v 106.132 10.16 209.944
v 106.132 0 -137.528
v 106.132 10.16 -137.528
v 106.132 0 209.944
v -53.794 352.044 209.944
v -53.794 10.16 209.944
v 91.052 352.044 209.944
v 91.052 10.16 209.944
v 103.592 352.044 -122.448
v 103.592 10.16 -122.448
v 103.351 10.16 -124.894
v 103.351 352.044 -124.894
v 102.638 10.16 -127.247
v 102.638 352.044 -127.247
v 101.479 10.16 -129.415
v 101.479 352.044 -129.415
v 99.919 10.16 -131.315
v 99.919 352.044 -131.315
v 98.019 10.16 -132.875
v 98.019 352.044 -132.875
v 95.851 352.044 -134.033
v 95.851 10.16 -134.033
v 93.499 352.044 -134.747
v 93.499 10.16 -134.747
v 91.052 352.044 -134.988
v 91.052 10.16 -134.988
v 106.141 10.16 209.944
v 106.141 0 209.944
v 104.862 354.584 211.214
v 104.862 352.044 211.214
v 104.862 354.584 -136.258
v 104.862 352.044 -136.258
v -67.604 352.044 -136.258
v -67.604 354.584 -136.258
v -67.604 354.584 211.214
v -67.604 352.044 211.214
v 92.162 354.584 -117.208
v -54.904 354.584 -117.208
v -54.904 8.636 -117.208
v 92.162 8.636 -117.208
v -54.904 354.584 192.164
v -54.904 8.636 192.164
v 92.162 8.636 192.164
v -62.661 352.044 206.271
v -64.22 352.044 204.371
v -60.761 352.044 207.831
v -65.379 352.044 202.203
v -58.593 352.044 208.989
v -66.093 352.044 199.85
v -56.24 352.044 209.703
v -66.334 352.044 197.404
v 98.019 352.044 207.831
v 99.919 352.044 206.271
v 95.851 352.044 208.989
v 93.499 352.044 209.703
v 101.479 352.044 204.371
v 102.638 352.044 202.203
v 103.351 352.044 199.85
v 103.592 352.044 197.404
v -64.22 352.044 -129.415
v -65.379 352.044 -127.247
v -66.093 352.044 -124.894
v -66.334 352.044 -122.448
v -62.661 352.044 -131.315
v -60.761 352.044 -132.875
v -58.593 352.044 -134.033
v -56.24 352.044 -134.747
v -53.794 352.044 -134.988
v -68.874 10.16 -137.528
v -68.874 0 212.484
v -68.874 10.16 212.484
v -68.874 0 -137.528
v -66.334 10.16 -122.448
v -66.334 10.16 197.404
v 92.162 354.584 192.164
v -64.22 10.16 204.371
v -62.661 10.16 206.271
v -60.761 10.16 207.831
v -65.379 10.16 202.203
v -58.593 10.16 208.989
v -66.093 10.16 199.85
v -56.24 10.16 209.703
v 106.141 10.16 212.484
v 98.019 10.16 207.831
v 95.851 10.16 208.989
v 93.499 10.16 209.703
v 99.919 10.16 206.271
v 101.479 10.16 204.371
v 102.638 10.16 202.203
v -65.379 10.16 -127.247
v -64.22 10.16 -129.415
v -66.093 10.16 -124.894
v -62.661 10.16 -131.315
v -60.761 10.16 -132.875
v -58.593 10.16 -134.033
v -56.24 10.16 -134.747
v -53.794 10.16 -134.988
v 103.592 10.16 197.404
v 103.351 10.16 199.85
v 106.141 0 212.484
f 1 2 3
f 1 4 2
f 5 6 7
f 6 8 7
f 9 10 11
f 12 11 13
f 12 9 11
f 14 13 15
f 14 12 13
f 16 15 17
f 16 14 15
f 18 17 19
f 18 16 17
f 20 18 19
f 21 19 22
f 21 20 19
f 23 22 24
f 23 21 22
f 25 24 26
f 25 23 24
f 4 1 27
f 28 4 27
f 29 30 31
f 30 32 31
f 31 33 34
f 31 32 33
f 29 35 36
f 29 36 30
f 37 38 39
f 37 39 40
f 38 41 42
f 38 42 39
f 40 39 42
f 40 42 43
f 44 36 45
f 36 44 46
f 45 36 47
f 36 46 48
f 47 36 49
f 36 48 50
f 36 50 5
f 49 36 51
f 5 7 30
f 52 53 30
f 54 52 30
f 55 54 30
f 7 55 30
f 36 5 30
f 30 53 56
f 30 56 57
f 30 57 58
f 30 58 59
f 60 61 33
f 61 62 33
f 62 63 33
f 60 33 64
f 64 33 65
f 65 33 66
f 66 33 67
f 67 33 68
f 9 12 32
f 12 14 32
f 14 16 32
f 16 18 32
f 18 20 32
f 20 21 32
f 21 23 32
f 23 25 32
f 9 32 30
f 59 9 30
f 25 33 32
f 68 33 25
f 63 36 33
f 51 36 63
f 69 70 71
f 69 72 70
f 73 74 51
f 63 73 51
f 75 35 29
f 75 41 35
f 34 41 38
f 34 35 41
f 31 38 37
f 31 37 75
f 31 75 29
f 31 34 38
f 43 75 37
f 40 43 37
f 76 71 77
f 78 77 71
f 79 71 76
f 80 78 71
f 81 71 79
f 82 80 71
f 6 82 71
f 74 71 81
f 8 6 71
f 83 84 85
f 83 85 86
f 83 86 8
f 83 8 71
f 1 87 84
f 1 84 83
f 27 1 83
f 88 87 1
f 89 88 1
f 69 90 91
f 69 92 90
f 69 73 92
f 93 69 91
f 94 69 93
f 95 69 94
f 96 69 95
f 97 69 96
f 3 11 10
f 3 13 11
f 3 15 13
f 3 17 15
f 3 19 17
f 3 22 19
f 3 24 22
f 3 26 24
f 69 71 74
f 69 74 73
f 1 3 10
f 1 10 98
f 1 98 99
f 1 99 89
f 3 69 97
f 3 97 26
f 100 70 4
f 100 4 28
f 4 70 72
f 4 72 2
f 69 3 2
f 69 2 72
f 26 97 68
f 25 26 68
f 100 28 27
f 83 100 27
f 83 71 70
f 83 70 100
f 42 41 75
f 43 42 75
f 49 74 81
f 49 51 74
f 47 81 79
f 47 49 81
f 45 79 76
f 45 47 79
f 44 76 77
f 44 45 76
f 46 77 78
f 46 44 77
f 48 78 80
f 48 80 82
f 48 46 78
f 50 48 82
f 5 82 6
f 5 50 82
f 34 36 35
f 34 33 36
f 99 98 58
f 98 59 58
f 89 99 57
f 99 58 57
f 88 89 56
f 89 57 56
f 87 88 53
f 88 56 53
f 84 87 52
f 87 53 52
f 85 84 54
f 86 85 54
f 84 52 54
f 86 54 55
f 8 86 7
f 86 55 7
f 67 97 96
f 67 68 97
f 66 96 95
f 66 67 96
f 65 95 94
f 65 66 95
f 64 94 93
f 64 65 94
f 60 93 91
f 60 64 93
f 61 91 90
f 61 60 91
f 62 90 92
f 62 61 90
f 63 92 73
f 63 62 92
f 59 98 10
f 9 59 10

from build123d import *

# Parameters (mm, degrees)
SKETCH1_W            = 169.926
SKETCH1_H            = 344.932
BOSS_EXTRUDE1_DEPTH  = 379.984
SKETCH7_W            = 344.932
SKETCH7_H            = 10.16
BOSS_EXTRUDE4_DEPTH  = 2.54
SKETCH8_W            = 344.932
SKETCH8_H            = 10.16
BOSS_EXTRUDE5_DEPTH  = 2.54
SKETCH9_W            = 175.006
SKETCH9_H            = 10.16
BOSS_EXTRUDE6_DEPTH  = 2.54
SKETCH13_W           = 344.932
SKETCH13_H           = 2.54
BOSS_EXTRUDE9_DEPTH  = 1.27
SKETCH14_W           = 171.196
SKETCH14_H           = 2.54
BOSS_EXTRUDE10_DEPTH = 1.27
SKETCH15_W           = 346.202
SKETCH15_H           = 2.54
BOSS_EXTRUDE11_DEPTH = 1.27
SKETCH16_W           = 172.466
SKETCH16_H           = 2.54
BOSS_EXTRUDE12_DEPTH = 1.27
FILLET1_R            = 12.54
SKETCH23_W           = 175.014872456
SKETCH23_H           = 10.16
BOSS_EXTRUDE15_DEPTH = 2.54
SKETCH25_W           = 180.28813578
SKETCH25_H           = 28.656047844
CUT_EXTRUDE1_DEPTH   = 474.472
SKETCH26_W           = 147.066
SKETCH26_H           = 309.372
CUT_EXTRUDE2_DEPTH   = 345.948


with BuildPart() as part:
    # Sketch1 → Boss-Extrude1 (new body)
    with BuildSketch(Plane(origin=(0, 0, 0), x_dir=(1, 0, 0), z_dir=(0, 1, 0))):
        with Locations((18.629158276, -37.477981942)):
            Rectangle(SKETCH1_W, SKETCH1_H)
    extrude(amount=BOSS_EXTRUDE1_DEPTH)

    # Sketch7 → Boss-Extrude4 (add)
    with BuildSketch(Plane.ZY.offset(66.333841724)):
        with Locations((37.477981942, 5.08)):
            Rectangle(SKETCH7_W, SKETCH7_H)
    extrude(amount=BOSS_EXTRUDE4_DEPTH)

    # Sketch8 → Boss-Extrude5 (add)
    with BuildSketch(Plane(origin=(103.592158276, 0, 0), x_dir=(0, 0, -1), z_dir=(1, 0, 0))):
        with Locations((-37.477981942, 5.08)):
            Rectangle(SKETCH8_W, SKETCH8_H)
    extrude(amount=BOSS_EXTRUDE5_DEPTH)

    # Sketch9 → Boss-Extrude6 (add)
    with BuildSketch(Plane(origin=(0, 0, -134.988018058), x_dir=(-1, 0, 0), z_dir=(0, 0, -1))):
        with Locations((-18.629158276, 5.08)):
            Rectangle(SKETCH9_W, SKETCH9_H)
    extrude(amount=BOSS_EXTRUDE6_DEPTH)

    # Sketch13 → Boss-Extrude9 (add)
    with BuildSketch(Plane(origin=(103.592158276, 0, 0), x_dir=(0, 0, -1), z_dir=(1, 0, 0))):
        with Locations((-37.477981942, 353.314)):
            Rectangle(SKETCH13_W, SKETCH13_H)
    extrude(amount=BOSS_EXTRUDE9_DEPTH)

    # Sketch14 → Boss-Extrude10 (add)
    with BuildSketch(Plane(origin=(0, 0, -134.988018058), x_dir=(-1, 0, 0), z_dir=(0, 0, -1))):
        with Locations((-19.264158276, 353.314)):
            Rectangle(SKETCH14_W, SKETCH14_H)
    extrude(amount=BOSS_EXTRUDE10_DEPTH)

    # Sketch15 → Boss-Extrude11 (add)
    with BuildSketch(Plane.ZY.offset(66.333841724)):
        with Locations((36.842981942, 353.314)):
            Rectangle(SKETCH15_W, SKETCH15_H)
    extrude(amount=BOSS_EXTRUDE11_DEPTH)

    # Sketch16 → Boss-Extrude12 (add)
    with BuildSketch(Plane.XY.offset(209.943981942)):
        with Locations((18.629158276, 353.314)):
            Rectangle(SKETCH16_W, SKETCH16_H)
    extrude(amount=BOSS_EXTRUDE12_DEPTH)

    # Fillet1
    fillet1_edges = [part.edges().sort_by_distance(p)[0] for p in [
        (103.592158276, 379.984, 37.477981942),
        (18.629158276, 379.984, -134.988018058),
        (-66.333841724, 379.984, 37.477981942),
        (103.592158276, 181.102, 209.943981942),
        (103.592158276, 181.102, -134.988018058),
        (-66.333841724, 181.102, -134.988018058),
        (-66.333841724, 367.284, -134.988018058),
        (103.592158276, 367.284, -134.988018058),
        (103.592158276, 367.284, 209.943981942),
        (-66.333841724, 367.284, 209.943981942),
        (-66.333841724, 181.102, 209.943981942),
        (18.629158276, 379.984, 209.943981942),
    ]]
    fillet(fillet1_edges, radius=FILLET1_R)

    # Sketch23 → Boss-Extrude15 (add)
    with BuildSketch(Plane.XY.offset(209.943981942)):
        with Locations((18.633594504, 5.08)):
            Rectangle(SKETCH23_W, SKETCH23_H)
    extrude(amount=BOSS_EXTRUDE15_DEPTH)

    # Sketch25 → Cut-Extrude1 (cut)
    with BuildSketch(Plane(origin=(0, 0, -134.988018058), x_dir=(-1, 0, 0), z_dir=(0, 0, -1))):
        with Locations((-13.448090386, 368.912023922)):
            Rectangle(SKETCH25_W, SKETCH25_H)
    extrude(amount=-CUT_EXTRUDE1_DEPTH, mode=Mode.SUBTRACT)

    # Sketch26 → Cut-Extrude2 (cut)
    with BuildSketch(Plane(origin=(0, 354.584, 0), x_dir=(1, 0, 0), z_dir=(0, 1, 0))):
        with Locations((18.629158276, -37.477981942)):
            Rectangle(SKETCH26_W, SKETCH26_H)
    extrude(amount=-CUT_EXTRUDE2_DEPTH, mode=Mode.SUBTRACT)


solid = part.part
